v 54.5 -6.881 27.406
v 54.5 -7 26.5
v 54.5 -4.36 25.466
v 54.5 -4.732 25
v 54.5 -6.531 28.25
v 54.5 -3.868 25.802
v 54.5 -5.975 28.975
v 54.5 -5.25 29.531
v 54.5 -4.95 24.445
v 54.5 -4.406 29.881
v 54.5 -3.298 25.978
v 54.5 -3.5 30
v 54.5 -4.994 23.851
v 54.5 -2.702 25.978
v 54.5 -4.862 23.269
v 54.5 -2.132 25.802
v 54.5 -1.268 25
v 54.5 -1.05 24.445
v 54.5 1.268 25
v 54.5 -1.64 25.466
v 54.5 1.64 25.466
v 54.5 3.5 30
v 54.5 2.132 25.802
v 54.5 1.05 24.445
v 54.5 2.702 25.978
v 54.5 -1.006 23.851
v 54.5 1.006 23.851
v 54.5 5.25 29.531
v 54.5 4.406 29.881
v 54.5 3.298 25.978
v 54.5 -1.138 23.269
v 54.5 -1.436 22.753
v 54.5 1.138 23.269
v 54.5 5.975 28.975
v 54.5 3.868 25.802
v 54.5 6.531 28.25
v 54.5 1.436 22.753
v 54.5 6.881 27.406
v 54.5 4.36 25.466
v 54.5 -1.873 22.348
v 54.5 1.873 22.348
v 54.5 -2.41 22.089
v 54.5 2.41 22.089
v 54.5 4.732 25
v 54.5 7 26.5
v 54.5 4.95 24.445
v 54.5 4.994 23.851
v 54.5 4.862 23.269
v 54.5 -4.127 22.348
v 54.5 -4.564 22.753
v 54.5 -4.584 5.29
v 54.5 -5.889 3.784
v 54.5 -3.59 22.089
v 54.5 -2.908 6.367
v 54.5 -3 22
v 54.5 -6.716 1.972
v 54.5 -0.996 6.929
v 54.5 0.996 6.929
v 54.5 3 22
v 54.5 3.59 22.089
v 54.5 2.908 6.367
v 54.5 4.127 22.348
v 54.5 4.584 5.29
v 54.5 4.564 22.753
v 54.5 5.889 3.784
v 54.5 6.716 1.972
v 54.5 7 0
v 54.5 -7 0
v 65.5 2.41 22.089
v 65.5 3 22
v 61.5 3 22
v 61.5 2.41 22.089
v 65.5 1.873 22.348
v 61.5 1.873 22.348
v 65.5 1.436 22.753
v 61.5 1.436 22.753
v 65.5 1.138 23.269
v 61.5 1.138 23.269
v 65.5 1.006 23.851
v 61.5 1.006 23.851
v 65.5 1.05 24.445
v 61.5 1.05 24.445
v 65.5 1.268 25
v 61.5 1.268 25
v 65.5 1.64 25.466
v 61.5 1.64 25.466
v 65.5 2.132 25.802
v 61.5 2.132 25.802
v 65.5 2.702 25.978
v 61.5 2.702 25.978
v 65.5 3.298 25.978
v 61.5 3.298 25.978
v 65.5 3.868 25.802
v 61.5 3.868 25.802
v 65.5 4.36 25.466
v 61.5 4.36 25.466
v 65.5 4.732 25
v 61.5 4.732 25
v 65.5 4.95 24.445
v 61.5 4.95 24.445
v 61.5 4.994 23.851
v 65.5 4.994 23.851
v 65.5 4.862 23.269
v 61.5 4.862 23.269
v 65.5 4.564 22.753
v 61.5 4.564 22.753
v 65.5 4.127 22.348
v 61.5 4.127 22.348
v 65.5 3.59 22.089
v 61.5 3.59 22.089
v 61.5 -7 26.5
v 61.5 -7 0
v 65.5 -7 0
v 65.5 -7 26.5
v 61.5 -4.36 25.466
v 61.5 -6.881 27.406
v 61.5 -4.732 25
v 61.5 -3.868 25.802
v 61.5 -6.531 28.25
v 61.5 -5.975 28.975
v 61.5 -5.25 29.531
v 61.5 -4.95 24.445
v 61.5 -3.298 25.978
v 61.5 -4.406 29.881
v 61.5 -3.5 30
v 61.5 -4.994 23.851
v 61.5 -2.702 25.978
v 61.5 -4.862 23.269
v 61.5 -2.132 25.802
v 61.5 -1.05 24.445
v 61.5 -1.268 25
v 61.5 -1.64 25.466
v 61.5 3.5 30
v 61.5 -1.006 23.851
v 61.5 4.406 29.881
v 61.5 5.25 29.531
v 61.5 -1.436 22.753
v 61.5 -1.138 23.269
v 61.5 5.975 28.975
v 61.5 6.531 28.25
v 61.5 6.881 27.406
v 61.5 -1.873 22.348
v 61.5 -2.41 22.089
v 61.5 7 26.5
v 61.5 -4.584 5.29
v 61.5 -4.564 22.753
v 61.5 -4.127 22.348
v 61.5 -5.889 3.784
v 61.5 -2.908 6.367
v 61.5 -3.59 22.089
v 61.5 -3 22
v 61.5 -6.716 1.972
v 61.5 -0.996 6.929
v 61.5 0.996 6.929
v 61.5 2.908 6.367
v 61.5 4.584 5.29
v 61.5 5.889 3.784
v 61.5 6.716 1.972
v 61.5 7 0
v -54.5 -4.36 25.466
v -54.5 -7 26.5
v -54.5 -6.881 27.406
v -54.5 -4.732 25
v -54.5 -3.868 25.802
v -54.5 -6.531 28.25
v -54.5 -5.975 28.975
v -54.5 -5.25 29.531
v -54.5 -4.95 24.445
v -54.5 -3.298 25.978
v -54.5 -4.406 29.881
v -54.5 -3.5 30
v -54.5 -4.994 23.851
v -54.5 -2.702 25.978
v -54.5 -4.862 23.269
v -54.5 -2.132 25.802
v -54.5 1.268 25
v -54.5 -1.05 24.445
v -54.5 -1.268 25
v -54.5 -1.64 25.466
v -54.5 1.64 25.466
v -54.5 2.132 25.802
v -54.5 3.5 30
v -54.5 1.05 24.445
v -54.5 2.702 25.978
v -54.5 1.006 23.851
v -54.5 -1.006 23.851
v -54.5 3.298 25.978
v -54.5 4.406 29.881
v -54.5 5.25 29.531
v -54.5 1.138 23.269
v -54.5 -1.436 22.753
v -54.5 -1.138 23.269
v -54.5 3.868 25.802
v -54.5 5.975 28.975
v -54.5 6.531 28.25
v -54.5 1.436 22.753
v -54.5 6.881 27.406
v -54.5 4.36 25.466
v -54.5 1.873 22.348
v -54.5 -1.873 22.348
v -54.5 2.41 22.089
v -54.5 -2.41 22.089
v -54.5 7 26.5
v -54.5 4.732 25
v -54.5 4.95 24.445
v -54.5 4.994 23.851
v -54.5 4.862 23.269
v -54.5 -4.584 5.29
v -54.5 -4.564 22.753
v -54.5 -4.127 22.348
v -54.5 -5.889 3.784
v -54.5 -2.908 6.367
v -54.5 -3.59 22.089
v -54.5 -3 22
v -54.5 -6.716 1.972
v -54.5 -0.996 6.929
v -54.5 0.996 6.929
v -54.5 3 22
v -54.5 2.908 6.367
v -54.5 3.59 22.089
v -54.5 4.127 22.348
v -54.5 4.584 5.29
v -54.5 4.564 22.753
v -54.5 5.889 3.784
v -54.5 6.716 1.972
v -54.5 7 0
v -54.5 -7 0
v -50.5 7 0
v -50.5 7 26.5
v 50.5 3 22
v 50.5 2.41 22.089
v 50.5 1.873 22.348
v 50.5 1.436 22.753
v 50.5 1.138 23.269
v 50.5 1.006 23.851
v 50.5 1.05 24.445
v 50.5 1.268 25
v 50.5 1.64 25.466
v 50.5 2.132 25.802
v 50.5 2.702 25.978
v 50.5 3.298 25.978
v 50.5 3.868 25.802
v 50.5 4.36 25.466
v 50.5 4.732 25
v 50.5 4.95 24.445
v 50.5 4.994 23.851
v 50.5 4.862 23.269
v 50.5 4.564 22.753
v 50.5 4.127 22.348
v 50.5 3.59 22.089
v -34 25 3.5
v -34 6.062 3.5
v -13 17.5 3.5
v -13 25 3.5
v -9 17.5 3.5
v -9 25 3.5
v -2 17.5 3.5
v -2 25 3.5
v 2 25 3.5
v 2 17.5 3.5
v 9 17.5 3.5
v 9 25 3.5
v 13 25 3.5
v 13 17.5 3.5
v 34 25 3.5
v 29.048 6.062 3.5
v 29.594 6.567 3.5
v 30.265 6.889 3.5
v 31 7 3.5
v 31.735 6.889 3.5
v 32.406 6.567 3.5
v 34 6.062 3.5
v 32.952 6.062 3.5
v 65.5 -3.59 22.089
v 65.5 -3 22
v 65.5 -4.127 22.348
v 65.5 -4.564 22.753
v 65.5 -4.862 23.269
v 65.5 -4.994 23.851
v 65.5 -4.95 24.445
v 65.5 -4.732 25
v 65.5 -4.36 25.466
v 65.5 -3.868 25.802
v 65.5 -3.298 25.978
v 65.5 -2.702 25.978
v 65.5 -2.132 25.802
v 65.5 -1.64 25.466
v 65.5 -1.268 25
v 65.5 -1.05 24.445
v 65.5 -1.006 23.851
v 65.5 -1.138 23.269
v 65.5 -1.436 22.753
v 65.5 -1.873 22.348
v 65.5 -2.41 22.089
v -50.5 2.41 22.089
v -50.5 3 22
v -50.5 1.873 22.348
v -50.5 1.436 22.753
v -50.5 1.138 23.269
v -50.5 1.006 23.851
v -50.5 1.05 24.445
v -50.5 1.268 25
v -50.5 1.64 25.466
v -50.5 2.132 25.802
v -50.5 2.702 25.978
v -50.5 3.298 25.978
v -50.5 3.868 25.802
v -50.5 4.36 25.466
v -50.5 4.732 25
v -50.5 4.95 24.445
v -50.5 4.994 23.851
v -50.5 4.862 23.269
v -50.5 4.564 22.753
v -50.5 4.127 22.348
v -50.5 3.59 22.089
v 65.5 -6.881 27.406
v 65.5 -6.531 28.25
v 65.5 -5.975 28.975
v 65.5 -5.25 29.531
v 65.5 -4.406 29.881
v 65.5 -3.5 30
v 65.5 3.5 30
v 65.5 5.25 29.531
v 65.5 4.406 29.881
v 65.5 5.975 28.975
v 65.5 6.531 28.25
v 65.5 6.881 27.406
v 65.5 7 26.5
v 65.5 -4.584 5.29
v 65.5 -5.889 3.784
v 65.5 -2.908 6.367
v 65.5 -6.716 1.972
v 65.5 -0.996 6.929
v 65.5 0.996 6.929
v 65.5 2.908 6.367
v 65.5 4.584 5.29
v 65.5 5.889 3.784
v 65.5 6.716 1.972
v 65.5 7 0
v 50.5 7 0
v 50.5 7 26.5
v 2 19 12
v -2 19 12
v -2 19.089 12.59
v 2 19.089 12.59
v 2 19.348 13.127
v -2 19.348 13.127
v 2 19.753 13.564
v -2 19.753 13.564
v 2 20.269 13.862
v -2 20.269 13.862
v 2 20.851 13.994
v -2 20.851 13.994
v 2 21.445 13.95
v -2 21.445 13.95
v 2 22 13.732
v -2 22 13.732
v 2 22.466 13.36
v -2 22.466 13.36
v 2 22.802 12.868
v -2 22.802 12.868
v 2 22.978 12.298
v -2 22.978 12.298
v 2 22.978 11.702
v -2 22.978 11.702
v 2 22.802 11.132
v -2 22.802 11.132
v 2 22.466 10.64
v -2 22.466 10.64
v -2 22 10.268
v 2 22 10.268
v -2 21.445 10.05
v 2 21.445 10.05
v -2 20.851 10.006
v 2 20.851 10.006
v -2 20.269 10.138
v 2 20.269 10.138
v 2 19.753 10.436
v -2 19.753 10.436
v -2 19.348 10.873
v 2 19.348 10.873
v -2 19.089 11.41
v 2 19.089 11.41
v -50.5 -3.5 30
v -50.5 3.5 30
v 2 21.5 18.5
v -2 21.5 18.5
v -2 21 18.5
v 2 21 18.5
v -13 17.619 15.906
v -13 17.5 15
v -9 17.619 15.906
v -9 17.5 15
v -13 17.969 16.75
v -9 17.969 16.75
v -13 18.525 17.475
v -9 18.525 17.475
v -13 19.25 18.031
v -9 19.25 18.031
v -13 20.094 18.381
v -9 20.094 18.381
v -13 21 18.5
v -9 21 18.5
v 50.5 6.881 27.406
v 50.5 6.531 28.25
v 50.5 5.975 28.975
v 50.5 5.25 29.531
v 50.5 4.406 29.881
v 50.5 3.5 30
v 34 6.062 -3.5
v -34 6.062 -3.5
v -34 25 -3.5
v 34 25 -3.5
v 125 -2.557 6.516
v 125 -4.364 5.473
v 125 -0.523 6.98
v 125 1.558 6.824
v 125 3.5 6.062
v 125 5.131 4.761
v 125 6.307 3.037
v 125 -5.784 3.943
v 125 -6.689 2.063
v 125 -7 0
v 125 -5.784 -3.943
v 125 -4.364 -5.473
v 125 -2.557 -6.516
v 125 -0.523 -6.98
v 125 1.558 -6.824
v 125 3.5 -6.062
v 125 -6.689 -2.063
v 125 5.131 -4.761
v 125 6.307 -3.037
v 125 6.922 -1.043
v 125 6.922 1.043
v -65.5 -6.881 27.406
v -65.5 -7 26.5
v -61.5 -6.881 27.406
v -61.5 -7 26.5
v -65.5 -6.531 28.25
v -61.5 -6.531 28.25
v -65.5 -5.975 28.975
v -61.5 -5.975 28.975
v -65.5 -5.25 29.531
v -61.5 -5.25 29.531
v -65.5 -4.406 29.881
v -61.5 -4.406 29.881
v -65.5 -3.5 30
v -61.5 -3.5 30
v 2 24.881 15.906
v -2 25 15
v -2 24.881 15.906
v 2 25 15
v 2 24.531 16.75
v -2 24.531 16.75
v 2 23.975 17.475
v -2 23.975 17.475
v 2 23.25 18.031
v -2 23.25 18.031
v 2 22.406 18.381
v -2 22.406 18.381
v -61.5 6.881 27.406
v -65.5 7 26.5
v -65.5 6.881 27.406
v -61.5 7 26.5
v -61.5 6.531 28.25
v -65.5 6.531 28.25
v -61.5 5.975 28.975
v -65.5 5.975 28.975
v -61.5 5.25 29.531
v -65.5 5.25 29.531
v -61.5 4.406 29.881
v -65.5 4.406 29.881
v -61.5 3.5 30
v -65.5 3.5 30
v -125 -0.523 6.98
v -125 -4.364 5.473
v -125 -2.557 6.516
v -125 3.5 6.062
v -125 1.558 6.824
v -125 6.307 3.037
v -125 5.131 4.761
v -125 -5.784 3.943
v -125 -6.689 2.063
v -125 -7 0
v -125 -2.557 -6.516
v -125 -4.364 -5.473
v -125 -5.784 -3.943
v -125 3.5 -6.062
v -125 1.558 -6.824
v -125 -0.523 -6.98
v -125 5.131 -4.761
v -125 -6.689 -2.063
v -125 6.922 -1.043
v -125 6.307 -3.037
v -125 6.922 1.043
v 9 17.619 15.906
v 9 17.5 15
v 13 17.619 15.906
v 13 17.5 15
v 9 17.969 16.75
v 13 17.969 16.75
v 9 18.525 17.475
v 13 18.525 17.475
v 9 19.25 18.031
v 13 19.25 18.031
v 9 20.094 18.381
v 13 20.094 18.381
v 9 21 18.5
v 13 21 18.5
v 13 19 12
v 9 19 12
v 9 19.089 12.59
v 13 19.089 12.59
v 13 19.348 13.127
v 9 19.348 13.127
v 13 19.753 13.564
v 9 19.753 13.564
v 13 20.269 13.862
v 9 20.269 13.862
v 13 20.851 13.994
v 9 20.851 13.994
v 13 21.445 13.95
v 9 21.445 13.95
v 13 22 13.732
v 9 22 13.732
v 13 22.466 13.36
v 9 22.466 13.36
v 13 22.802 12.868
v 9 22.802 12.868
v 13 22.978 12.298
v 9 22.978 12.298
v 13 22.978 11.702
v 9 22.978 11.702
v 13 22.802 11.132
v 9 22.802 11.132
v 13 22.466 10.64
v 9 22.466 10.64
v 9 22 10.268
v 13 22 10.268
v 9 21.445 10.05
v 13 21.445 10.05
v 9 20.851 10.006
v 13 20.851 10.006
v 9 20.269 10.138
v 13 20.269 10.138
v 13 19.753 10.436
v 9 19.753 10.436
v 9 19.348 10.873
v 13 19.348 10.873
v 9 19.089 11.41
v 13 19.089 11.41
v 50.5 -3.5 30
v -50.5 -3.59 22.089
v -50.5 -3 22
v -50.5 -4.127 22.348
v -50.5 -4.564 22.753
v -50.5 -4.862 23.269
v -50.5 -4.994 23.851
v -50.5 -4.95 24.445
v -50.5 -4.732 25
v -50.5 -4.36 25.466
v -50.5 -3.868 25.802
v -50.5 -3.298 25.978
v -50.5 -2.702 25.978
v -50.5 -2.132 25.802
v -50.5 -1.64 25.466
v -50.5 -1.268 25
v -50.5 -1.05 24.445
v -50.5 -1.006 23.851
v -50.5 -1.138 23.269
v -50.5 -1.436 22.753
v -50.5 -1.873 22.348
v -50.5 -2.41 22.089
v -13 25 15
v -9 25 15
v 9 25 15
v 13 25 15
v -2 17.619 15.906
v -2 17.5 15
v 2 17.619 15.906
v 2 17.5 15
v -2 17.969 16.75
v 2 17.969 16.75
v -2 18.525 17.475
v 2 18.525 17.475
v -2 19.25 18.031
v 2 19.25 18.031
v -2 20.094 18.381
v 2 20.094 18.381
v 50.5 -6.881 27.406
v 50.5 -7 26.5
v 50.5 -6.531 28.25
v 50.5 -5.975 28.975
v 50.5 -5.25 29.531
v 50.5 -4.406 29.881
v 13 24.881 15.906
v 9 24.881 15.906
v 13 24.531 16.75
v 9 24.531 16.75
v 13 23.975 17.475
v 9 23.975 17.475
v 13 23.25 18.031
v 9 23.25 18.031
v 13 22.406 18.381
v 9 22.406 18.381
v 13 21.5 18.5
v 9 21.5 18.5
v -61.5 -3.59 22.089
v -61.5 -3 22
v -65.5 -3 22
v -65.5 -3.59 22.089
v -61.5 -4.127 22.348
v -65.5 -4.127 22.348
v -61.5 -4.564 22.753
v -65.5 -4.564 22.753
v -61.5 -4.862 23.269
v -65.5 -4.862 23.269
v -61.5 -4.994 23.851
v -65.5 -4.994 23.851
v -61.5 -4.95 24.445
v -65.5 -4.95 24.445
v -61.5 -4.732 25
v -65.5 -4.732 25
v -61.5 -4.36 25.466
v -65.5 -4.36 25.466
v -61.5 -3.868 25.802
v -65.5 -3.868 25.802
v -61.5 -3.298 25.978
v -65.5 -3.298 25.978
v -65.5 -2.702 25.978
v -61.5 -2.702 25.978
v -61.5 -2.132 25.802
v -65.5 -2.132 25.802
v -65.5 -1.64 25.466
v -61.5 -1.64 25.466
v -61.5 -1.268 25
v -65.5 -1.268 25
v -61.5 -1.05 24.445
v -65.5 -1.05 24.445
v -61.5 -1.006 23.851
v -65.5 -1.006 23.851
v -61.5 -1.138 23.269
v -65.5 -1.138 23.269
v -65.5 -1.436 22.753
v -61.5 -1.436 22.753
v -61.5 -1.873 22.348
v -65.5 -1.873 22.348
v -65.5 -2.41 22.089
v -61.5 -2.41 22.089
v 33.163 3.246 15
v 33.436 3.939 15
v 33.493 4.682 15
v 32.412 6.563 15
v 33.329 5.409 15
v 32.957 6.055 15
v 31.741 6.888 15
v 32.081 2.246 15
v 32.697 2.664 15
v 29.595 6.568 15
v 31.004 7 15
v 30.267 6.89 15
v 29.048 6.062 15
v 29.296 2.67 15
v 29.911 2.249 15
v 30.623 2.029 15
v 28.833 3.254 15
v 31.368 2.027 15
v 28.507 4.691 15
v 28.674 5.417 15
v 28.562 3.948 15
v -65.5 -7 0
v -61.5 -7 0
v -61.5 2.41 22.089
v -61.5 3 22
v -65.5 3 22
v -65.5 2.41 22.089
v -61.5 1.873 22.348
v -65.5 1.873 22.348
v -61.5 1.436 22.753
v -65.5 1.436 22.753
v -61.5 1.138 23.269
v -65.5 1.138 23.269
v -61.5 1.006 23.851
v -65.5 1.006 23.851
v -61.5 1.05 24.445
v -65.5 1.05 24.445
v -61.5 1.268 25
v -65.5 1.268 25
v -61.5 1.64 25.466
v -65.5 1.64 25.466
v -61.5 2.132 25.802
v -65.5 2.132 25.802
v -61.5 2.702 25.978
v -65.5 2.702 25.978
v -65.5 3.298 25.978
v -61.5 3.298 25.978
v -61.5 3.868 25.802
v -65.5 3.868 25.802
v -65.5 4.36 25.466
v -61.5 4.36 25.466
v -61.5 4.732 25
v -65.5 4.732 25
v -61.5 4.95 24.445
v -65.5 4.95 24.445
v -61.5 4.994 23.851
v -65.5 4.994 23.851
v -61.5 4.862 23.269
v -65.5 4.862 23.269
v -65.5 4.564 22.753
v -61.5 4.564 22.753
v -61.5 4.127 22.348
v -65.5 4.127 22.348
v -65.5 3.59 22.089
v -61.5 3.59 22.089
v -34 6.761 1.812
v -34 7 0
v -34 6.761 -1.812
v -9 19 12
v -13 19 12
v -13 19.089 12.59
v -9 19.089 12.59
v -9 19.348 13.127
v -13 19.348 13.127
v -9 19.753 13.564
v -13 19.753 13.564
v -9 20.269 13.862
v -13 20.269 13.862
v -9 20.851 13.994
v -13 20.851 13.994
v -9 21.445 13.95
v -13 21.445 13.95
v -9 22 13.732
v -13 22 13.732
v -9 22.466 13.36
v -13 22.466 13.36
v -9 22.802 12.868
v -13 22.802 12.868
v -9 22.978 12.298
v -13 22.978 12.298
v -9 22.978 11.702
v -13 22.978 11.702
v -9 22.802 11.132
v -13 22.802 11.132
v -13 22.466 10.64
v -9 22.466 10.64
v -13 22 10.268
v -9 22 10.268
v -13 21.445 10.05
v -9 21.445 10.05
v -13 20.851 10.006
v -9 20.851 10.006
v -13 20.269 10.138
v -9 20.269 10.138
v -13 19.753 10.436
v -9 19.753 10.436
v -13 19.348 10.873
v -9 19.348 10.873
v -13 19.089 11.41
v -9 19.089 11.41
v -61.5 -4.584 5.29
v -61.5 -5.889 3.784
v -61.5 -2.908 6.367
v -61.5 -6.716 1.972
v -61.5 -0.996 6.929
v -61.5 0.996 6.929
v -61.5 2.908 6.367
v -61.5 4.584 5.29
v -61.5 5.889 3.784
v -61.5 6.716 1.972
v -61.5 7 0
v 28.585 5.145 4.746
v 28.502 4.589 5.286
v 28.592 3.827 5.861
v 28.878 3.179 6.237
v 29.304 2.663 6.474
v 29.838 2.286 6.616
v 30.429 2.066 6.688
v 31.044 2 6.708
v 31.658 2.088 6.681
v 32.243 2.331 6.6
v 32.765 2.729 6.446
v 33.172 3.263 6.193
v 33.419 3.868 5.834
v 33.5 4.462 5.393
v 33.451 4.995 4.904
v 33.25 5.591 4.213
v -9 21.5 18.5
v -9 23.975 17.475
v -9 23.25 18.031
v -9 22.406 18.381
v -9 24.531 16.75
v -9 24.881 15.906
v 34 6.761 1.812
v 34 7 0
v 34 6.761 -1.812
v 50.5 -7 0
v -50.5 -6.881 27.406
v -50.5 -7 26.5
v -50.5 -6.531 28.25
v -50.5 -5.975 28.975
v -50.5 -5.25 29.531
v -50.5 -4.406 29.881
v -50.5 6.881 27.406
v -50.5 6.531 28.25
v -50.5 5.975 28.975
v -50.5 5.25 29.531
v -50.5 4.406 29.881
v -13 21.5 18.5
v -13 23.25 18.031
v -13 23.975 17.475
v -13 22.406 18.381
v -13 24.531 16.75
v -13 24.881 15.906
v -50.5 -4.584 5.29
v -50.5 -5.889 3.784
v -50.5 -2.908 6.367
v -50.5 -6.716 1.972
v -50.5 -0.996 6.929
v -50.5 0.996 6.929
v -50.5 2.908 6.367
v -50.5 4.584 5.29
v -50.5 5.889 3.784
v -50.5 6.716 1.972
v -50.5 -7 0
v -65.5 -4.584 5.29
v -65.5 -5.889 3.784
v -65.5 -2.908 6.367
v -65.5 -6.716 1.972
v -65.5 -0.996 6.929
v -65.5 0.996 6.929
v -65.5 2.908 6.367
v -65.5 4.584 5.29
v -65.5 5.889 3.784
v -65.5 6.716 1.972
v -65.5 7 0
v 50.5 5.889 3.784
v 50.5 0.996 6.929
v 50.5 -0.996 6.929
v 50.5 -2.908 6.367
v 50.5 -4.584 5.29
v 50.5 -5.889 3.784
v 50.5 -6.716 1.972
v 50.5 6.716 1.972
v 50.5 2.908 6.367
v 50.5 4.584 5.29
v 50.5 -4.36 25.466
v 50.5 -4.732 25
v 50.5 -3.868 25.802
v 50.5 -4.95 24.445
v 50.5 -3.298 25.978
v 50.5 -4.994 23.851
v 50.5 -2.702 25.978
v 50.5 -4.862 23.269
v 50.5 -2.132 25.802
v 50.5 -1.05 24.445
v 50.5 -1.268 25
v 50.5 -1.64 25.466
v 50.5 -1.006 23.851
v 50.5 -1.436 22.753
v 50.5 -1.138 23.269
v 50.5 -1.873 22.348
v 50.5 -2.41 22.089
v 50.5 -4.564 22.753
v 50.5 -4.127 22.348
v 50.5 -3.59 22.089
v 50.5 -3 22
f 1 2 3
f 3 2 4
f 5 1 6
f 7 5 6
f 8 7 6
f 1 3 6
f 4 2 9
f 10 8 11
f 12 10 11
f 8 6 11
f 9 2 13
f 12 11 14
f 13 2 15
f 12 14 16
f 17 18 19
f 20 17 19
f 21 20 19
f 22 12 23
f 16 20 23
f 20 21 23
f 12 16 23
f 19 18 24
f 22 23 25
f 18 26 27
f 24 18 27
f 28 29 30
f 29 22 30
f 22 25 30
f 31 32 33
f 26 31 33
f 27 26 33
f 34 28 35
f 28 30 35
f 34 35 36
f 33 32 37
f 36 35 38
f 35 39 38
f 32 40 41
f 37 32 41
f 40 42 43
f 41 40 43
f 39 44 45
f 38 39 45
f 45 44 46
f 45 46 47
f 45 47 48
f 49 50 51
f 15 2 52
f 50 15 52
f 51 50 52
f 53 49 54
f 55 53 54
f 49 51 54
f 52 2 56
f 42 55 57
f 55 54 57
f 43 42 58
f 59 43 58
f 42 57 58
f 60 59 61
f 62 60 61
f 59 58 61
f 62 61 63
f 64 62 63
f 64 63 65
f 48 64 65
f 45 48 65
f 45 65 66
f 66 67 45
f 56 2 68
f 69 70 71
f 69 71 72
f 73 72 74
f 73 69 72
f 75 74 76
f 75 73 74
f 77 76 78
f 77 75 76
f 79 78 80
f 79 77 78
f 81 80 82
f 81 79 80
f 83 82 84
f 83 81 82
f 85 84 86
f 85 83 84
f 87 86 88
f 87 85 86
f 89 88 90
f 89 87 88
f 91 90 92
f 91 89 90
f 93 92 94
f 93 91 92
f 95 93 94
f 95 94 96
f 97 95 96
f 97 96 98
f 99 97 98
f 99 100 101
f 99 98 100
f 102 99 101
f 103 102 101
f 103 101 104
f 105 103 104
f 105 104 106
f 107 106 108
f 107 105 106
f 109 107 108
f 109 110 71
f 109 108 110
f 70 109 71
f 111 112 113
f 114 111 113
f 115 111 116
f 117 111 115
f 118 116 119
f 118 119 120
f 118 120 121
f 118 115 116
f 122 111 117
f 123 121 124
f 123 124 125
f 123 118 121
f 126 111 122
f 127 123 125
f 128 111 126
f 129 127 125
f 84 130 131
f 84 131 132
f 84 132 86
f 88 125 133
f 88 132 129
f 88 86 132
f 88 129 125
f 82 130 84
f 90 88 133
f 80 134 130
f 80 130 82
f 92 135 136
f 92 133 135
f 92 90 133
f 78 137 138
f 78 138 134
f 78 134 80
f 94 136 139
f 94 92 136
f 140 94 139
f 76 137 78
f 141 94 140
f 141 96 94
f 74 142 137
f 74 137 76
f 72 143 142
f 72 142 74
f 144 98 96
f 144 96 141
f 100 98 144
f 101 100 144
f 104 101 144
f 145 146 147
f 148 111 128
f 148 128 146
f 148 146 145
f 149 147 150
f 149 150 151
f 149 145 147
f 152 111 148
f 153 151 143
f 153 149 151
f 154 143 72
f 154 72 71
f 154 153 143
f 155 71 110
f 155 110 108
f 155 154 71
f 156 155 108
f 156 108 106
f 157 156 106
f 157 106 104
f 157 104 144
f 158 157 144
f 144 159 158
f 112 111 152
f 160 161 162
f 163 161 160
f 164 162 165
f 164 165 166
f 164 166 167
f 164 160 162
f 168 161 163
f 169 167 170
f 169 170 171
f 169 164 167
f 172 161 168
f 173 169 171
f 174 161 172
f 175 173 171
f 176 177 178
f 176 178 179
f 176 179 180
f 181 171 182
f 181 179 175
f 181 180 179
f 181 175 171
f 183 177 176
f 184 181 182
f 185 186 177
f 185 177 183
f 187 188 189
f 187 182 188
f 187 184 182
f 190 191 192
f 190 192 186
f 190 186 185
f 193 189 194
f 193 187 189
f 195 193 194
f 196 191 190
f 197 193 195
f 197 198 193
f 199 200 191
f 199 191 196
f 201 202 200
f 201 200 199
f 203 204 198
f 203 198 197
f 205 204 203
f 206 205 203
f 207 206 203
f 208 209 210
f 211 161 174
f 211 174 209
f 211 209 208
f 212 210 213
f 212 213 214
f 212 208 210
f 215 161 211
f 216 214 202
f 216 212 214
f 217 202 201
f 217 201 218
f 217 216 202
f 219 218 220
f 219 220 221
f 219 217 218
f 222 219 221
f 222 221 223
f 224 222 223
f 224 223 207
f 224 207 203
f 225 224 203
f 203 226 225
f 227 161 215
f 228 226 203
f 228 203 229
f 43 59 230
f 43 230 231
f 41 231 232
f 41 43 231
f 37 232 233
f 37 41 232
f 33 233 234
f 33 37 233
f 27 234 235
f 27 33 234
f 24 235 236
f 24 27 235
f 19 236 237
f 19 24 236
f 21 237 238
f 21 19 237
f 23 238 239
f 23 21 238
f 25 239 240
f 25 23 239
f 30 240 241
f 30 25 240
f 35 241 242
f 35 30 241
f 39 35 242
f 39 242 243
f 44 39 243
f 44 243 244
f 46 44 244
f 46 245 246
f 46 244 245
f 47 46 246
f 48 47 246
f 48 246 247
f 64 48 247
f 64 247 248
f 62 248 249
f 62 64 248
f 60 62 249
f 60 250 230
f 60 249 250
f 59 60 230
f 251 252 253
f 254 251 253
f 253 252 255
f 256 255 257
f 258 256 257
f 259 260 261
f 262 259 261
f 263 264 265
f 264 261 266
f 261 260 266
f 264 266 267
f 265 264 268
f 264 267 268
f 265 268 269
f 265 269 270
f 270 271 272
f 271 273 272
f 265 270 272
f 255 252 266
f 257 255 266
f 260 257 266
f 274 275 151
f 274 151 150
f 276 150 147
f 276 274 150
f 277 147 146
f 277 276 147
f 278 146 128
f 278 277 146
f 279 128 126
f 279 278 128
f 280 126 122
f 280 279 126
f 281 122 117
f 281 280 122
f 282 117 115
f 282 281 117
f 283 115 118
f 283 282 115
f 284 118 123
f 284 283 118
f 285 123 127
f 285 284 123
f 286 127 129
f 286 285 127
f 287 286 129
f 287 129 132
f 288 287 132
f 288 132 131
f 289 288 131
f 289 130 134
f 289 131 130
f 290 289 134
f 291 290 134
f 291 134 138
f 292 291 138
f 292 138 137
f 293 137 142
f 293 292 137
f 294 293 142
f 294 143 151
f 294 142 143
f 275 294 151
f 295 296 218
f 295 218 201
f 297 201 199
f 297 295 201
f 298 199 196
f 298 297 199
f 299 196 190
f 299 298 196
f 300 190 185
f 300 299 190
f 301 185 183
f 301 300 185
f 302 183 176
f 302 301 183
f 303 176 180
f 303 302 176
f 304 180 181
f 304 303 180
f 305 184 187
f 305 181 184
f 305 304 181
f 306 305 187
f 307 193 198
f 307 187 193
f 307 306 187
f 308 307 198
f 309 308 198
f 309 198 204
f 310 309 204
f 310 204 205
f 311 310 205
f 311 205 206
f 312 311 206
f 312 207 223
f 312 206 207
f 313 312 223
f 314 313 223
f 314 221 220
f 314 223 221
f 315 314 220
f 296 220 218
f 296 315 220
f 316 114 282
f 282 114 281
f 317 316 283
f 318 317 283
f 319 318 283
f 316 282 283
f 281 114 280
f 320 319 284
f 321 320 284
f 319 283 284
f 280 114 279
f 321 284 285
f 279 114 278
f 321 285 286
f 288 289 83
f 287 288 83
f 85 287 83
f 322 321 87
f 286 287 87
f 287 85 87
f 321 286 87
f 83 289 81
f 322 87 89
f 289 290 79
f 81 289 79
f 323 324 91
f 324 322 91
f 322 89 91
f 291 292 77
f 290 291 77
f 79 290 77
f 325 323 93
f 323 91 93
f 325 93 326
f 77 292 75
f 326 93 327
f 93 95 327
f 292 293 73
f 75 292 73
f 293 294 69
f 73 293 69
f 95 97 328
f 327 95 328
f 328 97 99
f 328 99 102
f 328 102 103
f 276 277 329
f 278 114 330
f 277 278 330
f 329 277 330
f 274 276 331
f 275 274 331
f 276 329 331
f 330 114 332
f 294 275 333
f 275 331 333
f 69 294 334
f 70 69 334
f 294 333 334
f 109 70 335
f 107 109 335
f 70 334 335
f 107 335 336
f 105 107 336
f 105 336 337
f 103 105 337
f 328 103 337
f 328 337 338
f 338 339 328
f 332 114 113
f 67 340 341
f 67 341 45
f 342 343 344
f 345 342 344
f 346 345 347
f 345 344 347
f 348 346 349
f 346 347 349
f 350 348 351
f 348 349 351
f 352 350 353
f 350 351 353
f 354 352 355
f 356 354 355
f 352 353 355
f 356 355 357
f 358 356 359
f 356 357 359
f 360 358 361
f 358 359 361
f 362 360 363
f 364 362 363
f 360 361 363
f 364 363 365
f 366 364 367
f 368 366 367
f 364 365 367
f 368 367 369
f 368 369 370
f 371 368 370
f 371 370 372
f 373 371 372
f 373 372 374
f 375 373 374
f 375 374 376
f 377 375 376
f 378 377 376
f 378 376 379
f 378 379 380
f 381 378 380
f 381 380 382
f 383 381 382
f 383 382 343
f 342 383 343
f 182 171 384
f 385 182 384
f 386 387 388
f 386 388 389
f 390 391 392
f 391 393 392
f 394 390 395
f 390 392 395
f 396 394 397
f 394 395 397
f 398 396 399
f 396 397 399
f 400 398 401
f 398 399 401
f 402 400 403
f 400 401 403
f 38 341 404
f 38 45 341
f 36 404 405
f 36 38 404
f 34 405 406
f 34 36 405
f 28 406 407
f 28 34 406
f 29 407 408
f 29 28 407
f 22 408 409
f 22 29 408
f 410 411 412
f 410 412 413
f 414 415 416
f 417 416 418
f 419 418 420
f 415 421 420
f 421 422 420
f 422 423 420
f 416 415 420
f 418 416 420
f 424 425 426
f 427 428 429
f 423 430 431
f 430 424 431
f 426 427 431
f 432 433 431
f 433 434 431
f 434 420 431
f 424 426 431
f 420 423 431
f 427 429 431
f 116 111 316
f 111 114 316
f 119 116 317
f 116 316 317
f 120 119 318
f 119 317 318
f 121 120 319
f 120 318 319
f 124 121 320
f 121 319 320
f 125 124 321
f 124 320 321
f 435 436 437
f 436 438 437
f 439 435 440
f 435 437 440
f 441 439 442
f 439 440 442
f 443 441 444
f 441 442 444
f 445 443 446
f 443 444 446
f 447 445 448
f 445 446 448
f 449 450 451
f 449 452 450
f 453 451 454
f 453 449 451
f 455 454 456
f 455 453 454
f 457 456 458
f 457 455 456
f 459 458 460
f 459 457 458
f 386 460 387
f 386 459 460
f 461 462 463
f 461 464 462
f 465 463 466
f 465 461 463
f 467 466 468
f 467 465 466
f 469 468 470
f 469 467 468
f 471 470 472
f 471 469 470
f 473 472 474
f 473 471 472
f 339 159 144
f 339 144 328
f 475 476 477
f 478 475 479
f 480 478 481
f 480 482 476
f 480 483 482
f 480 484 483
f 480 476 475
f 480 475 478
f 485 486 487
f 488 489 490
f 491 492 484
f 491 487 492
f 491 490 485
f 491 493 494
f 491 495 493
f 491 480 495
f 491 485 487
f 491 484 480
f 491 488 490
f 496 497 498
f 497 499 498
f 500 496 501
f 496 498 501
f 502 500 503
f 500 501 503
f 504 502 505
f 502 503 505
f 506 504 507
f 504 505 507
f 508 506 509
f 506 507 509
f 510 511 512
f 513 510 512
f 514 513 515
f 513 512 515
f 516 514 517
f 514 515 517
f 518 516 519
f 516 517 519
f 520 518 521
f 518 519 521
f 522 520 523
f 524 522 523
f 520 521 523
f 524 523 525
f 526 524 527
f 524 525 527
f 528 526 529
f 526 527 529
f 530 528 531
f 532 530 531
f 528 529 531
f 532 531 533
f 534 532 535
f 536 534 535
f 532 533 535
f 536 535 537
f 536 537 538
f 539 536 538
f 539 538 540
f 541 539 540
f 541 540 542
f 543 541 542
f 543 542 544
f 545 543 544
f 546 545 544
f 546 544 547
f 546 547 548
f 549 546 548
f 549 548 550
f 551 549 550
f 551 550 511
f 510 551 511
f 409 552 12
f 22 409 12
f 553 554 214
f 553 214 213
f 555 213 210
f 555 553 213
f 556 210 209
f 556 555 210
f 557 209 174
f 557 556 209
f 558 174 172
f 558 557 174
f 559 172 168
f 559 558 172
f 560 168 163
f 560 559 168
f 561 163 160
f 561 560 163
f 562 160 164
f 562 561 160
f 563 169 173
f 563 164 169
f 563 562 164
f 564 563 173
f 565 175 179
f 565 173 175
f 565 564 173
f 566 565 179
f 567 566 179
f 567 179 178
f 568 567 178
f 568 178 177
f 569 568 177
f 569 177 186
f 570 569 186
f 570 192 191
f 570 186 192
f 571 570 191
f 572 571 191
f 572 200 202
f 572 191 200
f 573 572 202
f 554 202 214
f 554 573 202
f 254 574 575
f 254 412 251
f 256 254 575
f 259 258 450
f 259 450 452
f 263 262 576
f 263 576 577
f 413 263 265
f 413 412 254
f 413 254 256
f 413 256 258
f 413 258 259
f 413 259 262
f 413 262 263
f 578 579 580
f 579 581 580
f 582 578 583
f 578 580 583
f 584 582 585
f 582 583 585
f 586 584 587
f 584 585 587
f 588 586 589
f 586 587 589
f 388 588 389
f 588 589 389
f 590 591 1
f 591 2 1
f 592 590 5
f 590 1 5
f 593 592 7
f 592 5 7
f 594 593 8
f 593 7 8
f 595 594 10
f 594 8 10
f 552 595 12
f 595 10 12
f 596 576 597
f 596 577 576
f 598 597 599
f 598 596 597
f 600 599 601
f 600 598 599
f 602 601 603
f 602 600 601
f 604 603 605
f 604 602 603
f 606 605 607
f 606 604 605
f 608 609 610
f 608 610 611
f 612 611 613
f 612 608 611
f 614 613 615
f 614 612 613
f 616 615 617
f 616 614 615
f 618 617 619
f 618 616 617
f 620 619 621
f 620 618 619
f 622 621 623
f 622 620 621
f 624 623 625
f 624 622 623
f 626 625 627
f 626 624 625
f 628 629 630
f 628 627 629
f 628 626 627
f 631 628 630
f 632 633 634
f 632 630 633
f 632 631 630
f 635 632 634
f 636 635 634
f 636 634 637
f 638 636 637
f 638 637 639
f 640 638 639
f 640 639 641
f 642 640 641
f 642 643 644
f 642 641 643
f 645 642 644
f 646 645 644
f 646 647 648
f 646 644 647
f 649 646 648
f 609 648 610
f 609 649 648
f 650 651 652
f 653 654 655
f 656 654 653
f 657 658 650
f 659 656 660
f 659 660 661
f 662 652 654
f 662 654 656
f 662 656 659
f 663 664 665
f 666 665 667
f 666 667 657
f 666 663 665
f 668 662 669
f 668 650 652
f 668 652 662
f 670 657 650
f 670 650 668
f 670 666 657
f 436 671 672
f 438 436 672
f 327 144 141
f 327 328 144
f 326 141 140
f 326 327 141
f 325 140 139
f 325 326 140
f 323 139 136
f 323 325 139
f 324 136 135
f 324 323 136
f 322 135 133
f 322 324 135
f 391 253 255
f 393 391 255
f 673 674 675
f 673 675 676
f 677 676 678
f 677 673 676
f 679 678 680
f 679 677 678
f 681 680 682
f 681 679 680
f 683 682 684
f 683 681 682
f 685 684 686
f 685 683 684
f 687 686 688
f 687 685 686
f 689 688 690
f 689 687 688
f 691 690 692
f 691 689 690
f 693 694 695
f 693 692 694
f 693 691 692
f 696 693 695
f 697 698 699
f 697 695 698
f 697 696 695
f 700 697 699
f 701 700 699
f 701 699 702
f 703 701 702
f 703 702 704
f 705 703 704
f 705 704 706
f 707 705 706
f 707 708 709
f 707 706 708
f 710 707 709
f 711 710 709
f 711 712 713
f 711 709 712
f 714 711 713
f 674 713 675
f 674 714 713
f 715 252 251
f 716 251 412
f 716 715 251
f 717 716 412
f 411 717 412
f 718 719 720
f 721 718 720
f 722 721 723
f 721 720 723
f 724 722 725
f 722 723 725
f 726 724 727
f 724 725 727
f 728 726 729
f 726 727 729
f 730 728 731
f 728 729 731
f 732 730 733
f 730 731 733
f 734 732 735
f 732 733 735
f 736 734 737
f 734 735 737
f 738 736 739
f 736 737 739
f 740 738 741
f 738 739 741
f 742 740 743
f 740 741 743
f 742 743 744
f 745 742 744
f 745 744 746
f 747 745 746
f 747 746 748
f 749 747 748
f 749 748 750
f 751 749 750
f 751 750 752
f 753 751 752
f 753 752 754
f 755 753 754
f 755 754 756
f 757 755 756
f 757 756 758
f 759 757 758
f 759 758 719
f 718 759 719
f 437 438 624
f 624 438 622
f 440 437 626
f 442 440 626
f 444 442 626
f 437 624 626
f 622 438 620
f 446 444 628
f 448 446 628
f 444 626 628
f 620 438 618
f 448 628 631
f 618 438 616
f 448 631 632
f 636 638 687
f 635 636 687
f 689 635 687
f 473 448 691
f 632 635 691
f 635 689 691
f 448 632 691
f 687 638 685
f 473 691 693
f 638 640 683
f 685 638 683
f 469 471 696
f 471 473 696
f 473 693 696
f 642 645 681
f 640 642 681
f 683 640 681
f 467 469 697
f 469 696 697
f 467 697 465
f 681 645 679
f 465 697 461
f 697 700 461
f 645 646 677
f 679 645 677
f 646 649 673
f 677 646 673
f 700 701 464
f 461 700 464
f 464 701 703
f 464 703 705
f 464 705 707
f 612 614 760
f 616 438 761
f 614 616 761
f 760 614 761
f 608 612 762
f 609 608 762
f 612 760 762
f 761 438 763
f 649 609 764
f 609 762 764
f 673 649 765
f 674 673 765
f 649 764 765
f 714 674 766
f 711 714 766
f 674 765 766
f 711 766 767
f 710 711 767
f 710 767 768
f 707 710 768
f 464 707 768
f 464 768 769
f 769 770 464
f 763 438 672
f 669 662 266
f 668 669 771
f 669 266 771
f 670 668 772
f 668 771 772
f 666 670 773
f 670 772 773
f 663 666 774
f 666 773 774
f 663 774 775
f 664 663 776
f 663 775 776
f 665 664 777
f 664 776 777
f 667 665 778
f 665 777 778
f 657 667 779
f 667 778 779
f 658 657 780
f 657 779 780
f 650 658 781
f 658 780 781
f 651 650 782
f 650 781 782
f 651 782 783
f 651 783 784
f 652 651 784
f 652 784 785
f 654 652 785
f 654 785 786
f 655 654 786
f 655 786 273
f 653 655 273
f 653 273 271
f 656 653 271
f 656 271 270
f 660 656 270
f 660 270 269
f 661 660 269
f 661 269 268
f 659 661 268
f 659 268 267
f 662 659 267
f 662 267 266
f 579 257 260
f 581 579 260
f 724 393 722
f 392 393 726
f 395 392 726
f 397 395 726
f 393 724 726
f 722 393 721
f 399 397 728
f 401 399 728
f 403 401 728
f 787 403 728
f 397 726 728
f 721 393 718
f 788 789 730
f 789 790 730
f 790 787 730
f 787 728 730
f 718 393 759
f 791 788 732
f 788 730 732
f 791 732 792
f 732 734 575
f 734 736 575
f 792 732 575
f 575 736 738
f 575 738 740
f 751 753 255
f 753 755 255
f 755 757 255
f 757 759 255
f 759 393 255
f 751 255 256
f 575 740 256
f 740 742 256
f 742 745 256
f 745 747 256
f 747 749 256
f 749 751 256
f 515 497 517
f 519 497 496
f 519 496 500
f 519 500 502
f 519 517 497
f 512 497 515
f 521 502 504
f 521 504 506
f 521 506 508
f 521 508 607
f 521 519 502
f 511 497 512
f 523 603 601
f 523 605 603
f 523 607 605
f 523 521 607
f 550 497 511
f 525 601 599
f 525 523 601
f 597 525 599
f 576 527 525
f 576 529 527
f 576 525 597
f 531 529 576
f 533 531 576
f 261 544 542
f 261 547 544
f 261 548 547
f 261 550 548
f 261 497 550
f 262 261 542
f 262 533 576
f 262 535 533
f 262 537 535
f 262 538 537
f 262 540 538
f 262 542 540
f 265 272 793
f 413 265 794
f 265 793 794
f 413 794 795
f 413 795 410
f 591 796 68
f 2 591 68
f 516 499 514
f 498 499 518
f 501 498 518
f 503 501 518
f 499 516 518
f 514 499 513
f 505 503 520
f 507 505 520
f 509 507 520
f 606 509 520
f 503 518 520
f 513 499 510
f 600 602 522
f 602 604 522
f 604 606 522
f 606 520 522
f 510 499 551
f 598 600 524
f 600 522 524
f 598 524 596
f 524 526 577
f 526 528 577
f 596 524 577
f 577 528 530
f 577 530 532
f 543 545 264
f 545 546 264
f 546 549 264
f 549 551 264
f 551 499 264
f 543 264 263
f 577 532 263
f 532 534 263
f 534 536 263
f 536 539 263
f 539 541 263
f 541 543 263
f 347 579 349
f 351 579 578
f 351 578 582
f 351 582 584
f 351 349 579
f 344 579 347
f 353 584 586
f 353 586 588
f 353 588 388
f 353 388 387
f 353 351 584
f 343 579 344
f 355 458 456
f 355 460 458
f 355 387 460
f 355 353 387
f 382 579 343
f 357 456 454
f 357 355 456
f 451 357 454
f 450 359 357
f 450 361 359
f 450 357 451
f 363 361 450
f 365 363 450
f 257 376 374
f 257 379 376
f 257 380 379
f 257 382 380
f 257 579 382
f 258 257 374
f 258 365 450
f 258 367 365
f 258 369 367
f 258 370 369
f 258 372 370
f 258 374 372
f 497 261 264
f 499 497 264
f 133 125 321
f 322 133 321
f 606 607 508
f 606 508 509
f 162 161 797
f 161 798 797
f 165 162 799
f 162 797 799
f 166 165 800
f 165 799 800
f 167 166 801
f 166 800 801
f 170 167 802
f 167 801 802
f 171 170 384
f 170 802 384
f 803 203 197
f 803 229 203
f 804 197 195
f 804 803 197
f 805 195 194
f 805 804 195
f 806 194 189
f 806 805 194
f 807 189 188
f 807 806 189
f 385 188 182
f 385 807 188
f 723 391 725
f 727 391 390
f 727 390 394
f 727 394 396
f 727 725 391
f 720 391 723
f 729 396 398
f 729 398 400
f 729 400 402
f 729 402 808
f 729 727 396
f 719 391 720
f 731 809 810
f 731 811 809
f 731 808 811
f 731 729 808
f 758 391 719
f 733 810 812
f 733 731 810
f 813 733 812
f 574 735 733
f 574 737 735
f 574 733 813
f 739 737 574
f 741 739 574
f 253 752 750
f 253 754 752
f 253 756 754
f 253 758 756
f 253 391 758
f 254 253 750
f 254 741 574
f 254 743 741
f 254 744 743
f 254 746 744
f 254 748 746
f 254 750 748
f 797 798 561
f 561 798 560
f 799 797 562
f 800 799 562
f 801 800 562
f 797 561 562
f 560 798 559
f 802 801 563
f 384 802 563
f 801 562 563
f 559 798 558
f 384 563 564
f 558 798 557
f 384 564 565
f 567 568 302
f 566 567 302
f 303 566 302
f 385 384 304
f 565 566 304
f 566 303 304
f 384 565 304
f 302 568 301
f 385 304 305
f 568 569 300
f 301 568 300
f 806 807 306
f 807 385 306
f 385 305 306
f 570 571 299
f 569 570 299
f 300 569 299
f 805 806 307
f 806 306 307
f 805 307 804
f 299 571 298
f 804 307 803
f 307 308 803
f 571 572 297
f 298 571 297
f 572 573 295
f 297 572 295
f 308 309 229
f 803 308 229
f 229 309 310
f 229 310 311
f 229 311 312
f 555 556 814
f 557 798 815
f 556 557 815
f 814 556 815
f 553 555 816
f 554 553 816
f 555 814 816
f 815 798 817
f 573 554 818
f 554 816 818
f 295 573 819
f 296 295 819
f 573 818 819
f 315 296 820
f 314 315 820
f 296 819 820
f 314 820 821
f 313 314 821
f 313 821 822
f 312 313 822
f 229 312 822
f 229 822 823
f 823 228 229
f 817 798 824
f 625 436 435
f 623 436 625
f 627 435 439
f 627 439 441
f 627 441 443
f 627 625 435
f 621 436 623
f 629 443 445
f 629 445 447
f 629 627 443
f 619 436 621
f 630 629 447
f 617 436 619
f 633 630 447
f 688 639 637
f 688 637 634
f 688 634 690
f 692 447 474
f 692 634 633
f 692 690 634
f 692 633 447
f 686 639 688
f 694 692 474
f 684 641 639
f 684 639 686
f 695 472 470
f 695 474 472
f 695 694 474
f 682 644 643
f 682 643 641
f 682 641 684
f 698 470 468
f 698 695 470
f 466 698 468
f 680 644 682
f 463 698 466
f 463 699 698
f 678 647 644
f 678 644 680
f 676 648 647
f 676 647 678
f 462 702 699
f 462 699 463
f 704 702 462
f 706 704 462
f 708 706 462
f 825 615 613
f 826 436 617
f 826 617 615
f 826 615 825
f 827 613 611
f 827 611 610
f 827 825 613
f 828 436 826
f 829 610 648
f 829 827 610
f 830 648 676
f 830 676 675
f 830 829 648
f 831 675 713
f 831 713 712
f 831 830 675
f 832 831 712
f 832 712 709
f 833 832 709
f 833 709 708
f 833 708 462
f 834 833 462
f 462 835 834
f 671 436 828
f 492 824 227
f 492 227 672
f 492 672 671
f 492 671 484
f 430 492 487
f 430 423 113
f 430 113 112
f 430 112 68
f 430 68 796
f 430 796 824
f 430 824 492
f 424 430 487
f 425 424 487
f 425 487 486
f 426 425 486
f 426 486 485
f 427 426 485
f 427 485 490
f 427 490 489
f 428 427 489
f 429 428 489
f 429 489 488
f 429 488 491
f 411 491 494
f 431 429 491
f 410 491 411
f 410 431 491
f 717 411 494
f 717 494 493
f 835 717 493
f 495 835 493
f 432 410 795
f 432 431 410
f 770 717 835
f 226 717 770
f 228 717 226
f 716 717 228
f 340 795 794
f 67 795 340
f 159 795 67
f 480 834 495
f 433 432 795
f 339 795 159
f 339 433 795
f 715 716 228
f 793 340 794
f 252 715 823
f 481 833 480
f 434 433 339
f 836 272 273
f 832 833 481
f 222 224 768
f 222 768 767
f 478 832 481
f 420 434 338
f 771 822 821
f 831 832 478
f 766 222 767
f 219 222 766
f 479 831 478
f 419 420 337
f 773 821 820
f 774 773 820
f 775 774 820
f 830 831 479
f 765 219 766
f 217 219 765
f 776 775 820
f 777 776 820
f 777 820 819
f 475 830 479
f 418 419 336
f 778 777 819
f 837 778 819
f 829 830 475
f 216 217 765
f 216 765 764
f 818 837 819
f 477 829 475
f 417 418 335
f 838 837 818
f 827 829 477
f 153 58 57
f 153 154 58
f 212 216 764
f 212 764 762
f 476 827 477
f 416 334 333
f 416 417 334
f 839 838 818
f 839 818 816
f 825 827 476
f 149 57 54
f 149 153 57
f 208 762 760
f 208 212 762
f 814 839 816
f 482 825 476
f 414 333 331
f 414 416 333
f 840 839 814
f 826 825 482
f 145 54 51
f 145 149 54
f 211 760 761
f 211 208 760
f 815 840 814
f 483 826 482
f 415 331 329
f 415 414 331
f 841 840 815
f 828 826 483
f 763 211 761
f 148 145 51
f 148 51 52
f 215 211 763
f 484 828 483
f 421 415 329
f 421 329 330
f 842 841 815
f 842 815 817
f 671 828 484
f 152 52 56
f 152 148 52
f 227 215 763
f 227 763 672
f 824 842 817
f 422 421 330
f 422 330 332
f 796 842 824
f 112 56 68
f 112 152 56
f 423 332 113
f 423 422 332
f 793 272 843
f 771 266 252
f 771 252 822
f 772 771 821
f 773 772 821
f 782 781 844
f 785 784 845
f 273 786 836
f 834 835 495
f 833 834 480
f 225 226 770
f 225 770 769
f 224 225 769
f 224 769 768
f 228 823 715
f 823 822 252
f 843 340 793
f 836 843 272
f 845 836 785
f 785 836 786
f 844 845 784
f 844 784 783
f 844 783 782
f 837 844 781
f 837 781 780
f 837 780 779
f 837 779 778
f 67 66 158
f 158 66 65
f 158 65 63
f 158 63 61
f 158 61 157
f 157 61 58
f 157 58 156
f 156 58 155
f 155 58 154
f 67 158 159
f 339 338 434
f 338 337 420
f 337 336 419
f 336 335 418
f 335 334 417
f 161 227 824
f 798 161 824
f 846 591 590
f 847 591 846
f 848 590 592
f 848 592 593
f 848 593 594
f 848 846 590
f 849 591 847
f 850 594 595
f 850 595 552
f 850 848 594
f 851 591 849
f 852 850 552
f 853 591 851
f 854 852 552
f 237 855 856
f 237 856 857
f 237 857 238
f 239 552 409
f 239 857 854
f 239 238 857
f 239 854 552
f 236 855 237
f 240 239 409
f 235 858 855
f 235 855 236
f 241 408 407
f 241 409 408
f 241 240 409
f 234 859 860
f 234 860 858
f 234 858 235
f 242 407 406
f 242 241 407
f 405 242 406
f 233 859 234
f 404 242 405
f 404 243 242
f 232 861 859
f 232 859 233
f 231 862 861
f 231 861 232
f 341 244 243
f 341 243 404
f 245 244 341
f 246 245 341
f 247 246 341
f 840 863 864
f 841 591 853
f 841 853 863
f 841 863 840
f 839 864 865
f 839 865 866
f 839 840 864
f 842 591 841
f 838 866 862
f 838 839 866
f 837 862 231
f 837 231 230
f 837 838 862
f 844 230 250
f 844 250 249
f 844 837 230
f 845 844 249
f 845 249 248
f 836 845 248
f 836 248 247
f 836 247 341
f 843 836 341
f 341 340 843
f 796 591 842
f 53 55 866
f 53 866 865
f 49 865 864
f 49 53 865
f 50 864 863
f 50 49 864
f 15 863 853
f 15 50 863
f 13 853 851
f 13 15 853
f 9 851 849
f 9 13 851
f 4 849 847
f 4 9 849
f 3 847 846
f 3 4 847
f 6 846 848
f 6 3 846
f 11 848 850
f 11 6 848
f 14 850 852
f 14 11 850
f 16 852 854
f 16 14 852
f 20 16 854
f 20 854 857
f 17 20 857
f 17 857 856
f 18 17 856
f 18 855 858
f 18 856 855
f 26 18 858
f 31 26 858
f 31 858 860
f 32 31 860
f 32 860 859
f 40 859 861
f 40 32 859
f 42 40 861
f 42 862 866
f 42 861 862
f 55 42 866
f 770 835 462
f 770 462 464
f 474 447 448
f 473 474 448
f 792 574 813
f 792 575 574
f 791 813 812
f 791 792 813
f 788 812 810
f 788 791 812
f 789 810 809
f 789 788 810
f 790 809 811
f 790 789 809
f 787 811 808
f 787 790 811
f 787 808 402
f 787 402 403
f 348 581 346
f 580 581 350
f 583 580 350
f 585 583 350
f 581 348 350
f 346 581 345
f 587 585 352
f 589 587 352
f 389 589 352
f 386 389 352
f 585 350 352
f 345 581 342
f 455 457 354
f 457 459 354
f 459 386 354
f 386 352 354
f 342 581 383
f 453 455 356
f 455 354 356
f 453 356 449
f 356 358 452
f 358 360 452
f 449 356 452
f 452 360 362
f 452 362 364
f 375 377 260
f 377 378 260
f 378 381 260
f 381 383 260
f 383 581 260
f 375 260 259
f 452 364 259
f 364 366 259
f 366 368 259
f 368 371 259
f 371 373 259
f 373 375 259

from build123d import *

# Parameters (mm, degrees)
SKETCH1_W               = 250
SKETCH1_H               = 7
SKETCH2_W               = 68
SKETCH2_H               = 7
BOSS_EXTRUDE1_DEPTH     = 25
SKETCH3_W               = 4
SKETCH3_H               = 7.5
BOSS_EXTRUDE2_DEPTH     = 15
FILLET1_R               = 3.5
SKETCH5_R               = 2.5
SKETCH5_W               = 4
SKETCH5_H               = 14
BOSS_EXTRUDE3_DEPTH     = 30
FILLET2_R               = 3.5
CUT_EXTRUDE1_DEPTH      = 195.461435879
CUT_EXTRUDE1_DEPTH_BACK = 195.461435879
SKETCH6_R               = 2
SKETCH4_R               = 2
CUT_EXTRUDE2_DEPTH      = 144.418966785
CUT_EXTRUDE3_START      = -15
SKETCH7_R               = 2.5
CUT_EXTRUDE3_DEPTH      = 15


with BuildPart() as part:
    # Sketch1 → Revolve-Thin1 (revolve)
    with BuildSketch(Plane.XY, mode=Mode.PRIVATE) as revolve_thin1_sk:
        with Locations((0, 3.5)):
            Rectangle(SKETCH1_W, SKETCH1_H)
    revolve(revolve_thin1_sk.sketch.rotate(Axis((-125, 0, 0), (1, 0, 0)), 180), axis=Axis((-125, 0, 0), (1, 0, 0)))

    # Sketch2 → Boss-Extrude1 (add)
    with BuildSketch(Plane(origin=(0, 0, 0), x_dir=(1, 0, 0), z_dir=(0, 1, 0))):
        Rectangle(SKETCH2_W, SKETCH2_H)
    extrude(amount=BOSS_EXTRUDE1_DEPTH)

    # Sketch3 → Boss-Extrude2 (add)
    with BuildSketch(Plane.XY.offset(3.5)):
        with Locations((-11, 21.25)):
            Rectangle(SKETCH3_W, SKETCH3_H)
        with Locations((0, 21.25)):
            Rectangle(SKETCH3_W, SKETCH3_H)
        with Locations((11, 21.25)):
            Rectangle(SKETCH3_W, SKETCH3_H)
    extrude(amount=BOSS_EXTRUDE2_DEPTH)

    # Fillet1
    fillet1_edges = [part.edges().sort_by_distance(p)[0] for p in [
        (-11, 17.5, 18.5),
        (-11, 25, 18.5),
        (0, 17.5, 18.5),
        (0, 25, 18.5),
        (11, 17.5, 18.5),
        (11, 25, 18.5),
    ]]
    fillet(fillet1_edges, radius=FILLET1_R)

    # Sketch5 → Boss-Extrude3 (add)
    with BuildSketch(Plane.XY):
        with Locations(Location((31, 4.5, 0), (0, 0, 141.327270593))):
            Circle(SKETCH5_R)
        with Locations((-52.5, 0)):
            Rectangle(SKETCH5_W, SKETCH5_H)
        with Locations((-63.5, 0)):
            Rectangle(SKETCH5_W, SKETCH5_H)
        with Locations((63.5, 0)):
            Rectangle(SKETCH5_W, SKETCH5_H)
        with Locations((52.5, 0)):
            Rectangle(SKETCH5_W, SKETCH5_H)
    extrude(amount=BOSS_EXTRUDE3_DEPTH)

    # Fillet2
    fillet2_edges = [part.edges().sort_by_distance(p)[0] for p in [
        (-63.5, 7, 30),
        (-63.5, -7, 30),
        (63.5, 7, 30),
        (63.5, -7, 30),
        (52.5, 7, 30),
        (52.5, -7, 30),
        (-52.5, -7, 30),
        (-52.5, 7, 30),
    ]]
    fillet(fillet2_edges, radius=FILLET2_R)

    # Sketch6 → Cut-Extrude1 (cut, two sides: drawn at the far end of the back side and taken through both)
    with BuildSketch(Plane.ZY.offset(65.5).offset(-CUT_EXTRUDE1_DEPTH_BACK)):
        with Locations(Location((24, 3, 0), (0, 0, 180))):
            Circle(SKETCH6_R)
        with Locations(Location((24, -3, 0), (0, 0, 180))):
            Circle(SKETCH6_R)
    extrude(amount=CUT_EXTRUDE1_DEPTH + CUT_EXTRUDE1_DEPTH_BACK, mode=Mode.SUBTRACT)

    # Sketch4 → Cut-Extrude2 (cut, through all)
    with BuildSketch(Plane.ZY.offset(13)):
        with Locations(Location((12, 21, 0), (0, 0, 270))):
            Circle(SKETCH4_R)
    extrude(amount=-CUT_EXTRUDE2_DEPTH, mode=Mode.SUBTRACT)

    # Sketch7 → Cut-Extrude3 (cut)
    with BuildSketch(Plane.XY.offset(30).offset(CUT_EXTRUDE3_START)):
        with Locations(Location((31, 4.5, 0), (0, 0, 141.327270593))):
            Circle(SKETCH7_R)
    extrude(amount=CUT_EXTRUDE3_DEPTH, mode=Mode.SUBTRACT)


solid = part.part
